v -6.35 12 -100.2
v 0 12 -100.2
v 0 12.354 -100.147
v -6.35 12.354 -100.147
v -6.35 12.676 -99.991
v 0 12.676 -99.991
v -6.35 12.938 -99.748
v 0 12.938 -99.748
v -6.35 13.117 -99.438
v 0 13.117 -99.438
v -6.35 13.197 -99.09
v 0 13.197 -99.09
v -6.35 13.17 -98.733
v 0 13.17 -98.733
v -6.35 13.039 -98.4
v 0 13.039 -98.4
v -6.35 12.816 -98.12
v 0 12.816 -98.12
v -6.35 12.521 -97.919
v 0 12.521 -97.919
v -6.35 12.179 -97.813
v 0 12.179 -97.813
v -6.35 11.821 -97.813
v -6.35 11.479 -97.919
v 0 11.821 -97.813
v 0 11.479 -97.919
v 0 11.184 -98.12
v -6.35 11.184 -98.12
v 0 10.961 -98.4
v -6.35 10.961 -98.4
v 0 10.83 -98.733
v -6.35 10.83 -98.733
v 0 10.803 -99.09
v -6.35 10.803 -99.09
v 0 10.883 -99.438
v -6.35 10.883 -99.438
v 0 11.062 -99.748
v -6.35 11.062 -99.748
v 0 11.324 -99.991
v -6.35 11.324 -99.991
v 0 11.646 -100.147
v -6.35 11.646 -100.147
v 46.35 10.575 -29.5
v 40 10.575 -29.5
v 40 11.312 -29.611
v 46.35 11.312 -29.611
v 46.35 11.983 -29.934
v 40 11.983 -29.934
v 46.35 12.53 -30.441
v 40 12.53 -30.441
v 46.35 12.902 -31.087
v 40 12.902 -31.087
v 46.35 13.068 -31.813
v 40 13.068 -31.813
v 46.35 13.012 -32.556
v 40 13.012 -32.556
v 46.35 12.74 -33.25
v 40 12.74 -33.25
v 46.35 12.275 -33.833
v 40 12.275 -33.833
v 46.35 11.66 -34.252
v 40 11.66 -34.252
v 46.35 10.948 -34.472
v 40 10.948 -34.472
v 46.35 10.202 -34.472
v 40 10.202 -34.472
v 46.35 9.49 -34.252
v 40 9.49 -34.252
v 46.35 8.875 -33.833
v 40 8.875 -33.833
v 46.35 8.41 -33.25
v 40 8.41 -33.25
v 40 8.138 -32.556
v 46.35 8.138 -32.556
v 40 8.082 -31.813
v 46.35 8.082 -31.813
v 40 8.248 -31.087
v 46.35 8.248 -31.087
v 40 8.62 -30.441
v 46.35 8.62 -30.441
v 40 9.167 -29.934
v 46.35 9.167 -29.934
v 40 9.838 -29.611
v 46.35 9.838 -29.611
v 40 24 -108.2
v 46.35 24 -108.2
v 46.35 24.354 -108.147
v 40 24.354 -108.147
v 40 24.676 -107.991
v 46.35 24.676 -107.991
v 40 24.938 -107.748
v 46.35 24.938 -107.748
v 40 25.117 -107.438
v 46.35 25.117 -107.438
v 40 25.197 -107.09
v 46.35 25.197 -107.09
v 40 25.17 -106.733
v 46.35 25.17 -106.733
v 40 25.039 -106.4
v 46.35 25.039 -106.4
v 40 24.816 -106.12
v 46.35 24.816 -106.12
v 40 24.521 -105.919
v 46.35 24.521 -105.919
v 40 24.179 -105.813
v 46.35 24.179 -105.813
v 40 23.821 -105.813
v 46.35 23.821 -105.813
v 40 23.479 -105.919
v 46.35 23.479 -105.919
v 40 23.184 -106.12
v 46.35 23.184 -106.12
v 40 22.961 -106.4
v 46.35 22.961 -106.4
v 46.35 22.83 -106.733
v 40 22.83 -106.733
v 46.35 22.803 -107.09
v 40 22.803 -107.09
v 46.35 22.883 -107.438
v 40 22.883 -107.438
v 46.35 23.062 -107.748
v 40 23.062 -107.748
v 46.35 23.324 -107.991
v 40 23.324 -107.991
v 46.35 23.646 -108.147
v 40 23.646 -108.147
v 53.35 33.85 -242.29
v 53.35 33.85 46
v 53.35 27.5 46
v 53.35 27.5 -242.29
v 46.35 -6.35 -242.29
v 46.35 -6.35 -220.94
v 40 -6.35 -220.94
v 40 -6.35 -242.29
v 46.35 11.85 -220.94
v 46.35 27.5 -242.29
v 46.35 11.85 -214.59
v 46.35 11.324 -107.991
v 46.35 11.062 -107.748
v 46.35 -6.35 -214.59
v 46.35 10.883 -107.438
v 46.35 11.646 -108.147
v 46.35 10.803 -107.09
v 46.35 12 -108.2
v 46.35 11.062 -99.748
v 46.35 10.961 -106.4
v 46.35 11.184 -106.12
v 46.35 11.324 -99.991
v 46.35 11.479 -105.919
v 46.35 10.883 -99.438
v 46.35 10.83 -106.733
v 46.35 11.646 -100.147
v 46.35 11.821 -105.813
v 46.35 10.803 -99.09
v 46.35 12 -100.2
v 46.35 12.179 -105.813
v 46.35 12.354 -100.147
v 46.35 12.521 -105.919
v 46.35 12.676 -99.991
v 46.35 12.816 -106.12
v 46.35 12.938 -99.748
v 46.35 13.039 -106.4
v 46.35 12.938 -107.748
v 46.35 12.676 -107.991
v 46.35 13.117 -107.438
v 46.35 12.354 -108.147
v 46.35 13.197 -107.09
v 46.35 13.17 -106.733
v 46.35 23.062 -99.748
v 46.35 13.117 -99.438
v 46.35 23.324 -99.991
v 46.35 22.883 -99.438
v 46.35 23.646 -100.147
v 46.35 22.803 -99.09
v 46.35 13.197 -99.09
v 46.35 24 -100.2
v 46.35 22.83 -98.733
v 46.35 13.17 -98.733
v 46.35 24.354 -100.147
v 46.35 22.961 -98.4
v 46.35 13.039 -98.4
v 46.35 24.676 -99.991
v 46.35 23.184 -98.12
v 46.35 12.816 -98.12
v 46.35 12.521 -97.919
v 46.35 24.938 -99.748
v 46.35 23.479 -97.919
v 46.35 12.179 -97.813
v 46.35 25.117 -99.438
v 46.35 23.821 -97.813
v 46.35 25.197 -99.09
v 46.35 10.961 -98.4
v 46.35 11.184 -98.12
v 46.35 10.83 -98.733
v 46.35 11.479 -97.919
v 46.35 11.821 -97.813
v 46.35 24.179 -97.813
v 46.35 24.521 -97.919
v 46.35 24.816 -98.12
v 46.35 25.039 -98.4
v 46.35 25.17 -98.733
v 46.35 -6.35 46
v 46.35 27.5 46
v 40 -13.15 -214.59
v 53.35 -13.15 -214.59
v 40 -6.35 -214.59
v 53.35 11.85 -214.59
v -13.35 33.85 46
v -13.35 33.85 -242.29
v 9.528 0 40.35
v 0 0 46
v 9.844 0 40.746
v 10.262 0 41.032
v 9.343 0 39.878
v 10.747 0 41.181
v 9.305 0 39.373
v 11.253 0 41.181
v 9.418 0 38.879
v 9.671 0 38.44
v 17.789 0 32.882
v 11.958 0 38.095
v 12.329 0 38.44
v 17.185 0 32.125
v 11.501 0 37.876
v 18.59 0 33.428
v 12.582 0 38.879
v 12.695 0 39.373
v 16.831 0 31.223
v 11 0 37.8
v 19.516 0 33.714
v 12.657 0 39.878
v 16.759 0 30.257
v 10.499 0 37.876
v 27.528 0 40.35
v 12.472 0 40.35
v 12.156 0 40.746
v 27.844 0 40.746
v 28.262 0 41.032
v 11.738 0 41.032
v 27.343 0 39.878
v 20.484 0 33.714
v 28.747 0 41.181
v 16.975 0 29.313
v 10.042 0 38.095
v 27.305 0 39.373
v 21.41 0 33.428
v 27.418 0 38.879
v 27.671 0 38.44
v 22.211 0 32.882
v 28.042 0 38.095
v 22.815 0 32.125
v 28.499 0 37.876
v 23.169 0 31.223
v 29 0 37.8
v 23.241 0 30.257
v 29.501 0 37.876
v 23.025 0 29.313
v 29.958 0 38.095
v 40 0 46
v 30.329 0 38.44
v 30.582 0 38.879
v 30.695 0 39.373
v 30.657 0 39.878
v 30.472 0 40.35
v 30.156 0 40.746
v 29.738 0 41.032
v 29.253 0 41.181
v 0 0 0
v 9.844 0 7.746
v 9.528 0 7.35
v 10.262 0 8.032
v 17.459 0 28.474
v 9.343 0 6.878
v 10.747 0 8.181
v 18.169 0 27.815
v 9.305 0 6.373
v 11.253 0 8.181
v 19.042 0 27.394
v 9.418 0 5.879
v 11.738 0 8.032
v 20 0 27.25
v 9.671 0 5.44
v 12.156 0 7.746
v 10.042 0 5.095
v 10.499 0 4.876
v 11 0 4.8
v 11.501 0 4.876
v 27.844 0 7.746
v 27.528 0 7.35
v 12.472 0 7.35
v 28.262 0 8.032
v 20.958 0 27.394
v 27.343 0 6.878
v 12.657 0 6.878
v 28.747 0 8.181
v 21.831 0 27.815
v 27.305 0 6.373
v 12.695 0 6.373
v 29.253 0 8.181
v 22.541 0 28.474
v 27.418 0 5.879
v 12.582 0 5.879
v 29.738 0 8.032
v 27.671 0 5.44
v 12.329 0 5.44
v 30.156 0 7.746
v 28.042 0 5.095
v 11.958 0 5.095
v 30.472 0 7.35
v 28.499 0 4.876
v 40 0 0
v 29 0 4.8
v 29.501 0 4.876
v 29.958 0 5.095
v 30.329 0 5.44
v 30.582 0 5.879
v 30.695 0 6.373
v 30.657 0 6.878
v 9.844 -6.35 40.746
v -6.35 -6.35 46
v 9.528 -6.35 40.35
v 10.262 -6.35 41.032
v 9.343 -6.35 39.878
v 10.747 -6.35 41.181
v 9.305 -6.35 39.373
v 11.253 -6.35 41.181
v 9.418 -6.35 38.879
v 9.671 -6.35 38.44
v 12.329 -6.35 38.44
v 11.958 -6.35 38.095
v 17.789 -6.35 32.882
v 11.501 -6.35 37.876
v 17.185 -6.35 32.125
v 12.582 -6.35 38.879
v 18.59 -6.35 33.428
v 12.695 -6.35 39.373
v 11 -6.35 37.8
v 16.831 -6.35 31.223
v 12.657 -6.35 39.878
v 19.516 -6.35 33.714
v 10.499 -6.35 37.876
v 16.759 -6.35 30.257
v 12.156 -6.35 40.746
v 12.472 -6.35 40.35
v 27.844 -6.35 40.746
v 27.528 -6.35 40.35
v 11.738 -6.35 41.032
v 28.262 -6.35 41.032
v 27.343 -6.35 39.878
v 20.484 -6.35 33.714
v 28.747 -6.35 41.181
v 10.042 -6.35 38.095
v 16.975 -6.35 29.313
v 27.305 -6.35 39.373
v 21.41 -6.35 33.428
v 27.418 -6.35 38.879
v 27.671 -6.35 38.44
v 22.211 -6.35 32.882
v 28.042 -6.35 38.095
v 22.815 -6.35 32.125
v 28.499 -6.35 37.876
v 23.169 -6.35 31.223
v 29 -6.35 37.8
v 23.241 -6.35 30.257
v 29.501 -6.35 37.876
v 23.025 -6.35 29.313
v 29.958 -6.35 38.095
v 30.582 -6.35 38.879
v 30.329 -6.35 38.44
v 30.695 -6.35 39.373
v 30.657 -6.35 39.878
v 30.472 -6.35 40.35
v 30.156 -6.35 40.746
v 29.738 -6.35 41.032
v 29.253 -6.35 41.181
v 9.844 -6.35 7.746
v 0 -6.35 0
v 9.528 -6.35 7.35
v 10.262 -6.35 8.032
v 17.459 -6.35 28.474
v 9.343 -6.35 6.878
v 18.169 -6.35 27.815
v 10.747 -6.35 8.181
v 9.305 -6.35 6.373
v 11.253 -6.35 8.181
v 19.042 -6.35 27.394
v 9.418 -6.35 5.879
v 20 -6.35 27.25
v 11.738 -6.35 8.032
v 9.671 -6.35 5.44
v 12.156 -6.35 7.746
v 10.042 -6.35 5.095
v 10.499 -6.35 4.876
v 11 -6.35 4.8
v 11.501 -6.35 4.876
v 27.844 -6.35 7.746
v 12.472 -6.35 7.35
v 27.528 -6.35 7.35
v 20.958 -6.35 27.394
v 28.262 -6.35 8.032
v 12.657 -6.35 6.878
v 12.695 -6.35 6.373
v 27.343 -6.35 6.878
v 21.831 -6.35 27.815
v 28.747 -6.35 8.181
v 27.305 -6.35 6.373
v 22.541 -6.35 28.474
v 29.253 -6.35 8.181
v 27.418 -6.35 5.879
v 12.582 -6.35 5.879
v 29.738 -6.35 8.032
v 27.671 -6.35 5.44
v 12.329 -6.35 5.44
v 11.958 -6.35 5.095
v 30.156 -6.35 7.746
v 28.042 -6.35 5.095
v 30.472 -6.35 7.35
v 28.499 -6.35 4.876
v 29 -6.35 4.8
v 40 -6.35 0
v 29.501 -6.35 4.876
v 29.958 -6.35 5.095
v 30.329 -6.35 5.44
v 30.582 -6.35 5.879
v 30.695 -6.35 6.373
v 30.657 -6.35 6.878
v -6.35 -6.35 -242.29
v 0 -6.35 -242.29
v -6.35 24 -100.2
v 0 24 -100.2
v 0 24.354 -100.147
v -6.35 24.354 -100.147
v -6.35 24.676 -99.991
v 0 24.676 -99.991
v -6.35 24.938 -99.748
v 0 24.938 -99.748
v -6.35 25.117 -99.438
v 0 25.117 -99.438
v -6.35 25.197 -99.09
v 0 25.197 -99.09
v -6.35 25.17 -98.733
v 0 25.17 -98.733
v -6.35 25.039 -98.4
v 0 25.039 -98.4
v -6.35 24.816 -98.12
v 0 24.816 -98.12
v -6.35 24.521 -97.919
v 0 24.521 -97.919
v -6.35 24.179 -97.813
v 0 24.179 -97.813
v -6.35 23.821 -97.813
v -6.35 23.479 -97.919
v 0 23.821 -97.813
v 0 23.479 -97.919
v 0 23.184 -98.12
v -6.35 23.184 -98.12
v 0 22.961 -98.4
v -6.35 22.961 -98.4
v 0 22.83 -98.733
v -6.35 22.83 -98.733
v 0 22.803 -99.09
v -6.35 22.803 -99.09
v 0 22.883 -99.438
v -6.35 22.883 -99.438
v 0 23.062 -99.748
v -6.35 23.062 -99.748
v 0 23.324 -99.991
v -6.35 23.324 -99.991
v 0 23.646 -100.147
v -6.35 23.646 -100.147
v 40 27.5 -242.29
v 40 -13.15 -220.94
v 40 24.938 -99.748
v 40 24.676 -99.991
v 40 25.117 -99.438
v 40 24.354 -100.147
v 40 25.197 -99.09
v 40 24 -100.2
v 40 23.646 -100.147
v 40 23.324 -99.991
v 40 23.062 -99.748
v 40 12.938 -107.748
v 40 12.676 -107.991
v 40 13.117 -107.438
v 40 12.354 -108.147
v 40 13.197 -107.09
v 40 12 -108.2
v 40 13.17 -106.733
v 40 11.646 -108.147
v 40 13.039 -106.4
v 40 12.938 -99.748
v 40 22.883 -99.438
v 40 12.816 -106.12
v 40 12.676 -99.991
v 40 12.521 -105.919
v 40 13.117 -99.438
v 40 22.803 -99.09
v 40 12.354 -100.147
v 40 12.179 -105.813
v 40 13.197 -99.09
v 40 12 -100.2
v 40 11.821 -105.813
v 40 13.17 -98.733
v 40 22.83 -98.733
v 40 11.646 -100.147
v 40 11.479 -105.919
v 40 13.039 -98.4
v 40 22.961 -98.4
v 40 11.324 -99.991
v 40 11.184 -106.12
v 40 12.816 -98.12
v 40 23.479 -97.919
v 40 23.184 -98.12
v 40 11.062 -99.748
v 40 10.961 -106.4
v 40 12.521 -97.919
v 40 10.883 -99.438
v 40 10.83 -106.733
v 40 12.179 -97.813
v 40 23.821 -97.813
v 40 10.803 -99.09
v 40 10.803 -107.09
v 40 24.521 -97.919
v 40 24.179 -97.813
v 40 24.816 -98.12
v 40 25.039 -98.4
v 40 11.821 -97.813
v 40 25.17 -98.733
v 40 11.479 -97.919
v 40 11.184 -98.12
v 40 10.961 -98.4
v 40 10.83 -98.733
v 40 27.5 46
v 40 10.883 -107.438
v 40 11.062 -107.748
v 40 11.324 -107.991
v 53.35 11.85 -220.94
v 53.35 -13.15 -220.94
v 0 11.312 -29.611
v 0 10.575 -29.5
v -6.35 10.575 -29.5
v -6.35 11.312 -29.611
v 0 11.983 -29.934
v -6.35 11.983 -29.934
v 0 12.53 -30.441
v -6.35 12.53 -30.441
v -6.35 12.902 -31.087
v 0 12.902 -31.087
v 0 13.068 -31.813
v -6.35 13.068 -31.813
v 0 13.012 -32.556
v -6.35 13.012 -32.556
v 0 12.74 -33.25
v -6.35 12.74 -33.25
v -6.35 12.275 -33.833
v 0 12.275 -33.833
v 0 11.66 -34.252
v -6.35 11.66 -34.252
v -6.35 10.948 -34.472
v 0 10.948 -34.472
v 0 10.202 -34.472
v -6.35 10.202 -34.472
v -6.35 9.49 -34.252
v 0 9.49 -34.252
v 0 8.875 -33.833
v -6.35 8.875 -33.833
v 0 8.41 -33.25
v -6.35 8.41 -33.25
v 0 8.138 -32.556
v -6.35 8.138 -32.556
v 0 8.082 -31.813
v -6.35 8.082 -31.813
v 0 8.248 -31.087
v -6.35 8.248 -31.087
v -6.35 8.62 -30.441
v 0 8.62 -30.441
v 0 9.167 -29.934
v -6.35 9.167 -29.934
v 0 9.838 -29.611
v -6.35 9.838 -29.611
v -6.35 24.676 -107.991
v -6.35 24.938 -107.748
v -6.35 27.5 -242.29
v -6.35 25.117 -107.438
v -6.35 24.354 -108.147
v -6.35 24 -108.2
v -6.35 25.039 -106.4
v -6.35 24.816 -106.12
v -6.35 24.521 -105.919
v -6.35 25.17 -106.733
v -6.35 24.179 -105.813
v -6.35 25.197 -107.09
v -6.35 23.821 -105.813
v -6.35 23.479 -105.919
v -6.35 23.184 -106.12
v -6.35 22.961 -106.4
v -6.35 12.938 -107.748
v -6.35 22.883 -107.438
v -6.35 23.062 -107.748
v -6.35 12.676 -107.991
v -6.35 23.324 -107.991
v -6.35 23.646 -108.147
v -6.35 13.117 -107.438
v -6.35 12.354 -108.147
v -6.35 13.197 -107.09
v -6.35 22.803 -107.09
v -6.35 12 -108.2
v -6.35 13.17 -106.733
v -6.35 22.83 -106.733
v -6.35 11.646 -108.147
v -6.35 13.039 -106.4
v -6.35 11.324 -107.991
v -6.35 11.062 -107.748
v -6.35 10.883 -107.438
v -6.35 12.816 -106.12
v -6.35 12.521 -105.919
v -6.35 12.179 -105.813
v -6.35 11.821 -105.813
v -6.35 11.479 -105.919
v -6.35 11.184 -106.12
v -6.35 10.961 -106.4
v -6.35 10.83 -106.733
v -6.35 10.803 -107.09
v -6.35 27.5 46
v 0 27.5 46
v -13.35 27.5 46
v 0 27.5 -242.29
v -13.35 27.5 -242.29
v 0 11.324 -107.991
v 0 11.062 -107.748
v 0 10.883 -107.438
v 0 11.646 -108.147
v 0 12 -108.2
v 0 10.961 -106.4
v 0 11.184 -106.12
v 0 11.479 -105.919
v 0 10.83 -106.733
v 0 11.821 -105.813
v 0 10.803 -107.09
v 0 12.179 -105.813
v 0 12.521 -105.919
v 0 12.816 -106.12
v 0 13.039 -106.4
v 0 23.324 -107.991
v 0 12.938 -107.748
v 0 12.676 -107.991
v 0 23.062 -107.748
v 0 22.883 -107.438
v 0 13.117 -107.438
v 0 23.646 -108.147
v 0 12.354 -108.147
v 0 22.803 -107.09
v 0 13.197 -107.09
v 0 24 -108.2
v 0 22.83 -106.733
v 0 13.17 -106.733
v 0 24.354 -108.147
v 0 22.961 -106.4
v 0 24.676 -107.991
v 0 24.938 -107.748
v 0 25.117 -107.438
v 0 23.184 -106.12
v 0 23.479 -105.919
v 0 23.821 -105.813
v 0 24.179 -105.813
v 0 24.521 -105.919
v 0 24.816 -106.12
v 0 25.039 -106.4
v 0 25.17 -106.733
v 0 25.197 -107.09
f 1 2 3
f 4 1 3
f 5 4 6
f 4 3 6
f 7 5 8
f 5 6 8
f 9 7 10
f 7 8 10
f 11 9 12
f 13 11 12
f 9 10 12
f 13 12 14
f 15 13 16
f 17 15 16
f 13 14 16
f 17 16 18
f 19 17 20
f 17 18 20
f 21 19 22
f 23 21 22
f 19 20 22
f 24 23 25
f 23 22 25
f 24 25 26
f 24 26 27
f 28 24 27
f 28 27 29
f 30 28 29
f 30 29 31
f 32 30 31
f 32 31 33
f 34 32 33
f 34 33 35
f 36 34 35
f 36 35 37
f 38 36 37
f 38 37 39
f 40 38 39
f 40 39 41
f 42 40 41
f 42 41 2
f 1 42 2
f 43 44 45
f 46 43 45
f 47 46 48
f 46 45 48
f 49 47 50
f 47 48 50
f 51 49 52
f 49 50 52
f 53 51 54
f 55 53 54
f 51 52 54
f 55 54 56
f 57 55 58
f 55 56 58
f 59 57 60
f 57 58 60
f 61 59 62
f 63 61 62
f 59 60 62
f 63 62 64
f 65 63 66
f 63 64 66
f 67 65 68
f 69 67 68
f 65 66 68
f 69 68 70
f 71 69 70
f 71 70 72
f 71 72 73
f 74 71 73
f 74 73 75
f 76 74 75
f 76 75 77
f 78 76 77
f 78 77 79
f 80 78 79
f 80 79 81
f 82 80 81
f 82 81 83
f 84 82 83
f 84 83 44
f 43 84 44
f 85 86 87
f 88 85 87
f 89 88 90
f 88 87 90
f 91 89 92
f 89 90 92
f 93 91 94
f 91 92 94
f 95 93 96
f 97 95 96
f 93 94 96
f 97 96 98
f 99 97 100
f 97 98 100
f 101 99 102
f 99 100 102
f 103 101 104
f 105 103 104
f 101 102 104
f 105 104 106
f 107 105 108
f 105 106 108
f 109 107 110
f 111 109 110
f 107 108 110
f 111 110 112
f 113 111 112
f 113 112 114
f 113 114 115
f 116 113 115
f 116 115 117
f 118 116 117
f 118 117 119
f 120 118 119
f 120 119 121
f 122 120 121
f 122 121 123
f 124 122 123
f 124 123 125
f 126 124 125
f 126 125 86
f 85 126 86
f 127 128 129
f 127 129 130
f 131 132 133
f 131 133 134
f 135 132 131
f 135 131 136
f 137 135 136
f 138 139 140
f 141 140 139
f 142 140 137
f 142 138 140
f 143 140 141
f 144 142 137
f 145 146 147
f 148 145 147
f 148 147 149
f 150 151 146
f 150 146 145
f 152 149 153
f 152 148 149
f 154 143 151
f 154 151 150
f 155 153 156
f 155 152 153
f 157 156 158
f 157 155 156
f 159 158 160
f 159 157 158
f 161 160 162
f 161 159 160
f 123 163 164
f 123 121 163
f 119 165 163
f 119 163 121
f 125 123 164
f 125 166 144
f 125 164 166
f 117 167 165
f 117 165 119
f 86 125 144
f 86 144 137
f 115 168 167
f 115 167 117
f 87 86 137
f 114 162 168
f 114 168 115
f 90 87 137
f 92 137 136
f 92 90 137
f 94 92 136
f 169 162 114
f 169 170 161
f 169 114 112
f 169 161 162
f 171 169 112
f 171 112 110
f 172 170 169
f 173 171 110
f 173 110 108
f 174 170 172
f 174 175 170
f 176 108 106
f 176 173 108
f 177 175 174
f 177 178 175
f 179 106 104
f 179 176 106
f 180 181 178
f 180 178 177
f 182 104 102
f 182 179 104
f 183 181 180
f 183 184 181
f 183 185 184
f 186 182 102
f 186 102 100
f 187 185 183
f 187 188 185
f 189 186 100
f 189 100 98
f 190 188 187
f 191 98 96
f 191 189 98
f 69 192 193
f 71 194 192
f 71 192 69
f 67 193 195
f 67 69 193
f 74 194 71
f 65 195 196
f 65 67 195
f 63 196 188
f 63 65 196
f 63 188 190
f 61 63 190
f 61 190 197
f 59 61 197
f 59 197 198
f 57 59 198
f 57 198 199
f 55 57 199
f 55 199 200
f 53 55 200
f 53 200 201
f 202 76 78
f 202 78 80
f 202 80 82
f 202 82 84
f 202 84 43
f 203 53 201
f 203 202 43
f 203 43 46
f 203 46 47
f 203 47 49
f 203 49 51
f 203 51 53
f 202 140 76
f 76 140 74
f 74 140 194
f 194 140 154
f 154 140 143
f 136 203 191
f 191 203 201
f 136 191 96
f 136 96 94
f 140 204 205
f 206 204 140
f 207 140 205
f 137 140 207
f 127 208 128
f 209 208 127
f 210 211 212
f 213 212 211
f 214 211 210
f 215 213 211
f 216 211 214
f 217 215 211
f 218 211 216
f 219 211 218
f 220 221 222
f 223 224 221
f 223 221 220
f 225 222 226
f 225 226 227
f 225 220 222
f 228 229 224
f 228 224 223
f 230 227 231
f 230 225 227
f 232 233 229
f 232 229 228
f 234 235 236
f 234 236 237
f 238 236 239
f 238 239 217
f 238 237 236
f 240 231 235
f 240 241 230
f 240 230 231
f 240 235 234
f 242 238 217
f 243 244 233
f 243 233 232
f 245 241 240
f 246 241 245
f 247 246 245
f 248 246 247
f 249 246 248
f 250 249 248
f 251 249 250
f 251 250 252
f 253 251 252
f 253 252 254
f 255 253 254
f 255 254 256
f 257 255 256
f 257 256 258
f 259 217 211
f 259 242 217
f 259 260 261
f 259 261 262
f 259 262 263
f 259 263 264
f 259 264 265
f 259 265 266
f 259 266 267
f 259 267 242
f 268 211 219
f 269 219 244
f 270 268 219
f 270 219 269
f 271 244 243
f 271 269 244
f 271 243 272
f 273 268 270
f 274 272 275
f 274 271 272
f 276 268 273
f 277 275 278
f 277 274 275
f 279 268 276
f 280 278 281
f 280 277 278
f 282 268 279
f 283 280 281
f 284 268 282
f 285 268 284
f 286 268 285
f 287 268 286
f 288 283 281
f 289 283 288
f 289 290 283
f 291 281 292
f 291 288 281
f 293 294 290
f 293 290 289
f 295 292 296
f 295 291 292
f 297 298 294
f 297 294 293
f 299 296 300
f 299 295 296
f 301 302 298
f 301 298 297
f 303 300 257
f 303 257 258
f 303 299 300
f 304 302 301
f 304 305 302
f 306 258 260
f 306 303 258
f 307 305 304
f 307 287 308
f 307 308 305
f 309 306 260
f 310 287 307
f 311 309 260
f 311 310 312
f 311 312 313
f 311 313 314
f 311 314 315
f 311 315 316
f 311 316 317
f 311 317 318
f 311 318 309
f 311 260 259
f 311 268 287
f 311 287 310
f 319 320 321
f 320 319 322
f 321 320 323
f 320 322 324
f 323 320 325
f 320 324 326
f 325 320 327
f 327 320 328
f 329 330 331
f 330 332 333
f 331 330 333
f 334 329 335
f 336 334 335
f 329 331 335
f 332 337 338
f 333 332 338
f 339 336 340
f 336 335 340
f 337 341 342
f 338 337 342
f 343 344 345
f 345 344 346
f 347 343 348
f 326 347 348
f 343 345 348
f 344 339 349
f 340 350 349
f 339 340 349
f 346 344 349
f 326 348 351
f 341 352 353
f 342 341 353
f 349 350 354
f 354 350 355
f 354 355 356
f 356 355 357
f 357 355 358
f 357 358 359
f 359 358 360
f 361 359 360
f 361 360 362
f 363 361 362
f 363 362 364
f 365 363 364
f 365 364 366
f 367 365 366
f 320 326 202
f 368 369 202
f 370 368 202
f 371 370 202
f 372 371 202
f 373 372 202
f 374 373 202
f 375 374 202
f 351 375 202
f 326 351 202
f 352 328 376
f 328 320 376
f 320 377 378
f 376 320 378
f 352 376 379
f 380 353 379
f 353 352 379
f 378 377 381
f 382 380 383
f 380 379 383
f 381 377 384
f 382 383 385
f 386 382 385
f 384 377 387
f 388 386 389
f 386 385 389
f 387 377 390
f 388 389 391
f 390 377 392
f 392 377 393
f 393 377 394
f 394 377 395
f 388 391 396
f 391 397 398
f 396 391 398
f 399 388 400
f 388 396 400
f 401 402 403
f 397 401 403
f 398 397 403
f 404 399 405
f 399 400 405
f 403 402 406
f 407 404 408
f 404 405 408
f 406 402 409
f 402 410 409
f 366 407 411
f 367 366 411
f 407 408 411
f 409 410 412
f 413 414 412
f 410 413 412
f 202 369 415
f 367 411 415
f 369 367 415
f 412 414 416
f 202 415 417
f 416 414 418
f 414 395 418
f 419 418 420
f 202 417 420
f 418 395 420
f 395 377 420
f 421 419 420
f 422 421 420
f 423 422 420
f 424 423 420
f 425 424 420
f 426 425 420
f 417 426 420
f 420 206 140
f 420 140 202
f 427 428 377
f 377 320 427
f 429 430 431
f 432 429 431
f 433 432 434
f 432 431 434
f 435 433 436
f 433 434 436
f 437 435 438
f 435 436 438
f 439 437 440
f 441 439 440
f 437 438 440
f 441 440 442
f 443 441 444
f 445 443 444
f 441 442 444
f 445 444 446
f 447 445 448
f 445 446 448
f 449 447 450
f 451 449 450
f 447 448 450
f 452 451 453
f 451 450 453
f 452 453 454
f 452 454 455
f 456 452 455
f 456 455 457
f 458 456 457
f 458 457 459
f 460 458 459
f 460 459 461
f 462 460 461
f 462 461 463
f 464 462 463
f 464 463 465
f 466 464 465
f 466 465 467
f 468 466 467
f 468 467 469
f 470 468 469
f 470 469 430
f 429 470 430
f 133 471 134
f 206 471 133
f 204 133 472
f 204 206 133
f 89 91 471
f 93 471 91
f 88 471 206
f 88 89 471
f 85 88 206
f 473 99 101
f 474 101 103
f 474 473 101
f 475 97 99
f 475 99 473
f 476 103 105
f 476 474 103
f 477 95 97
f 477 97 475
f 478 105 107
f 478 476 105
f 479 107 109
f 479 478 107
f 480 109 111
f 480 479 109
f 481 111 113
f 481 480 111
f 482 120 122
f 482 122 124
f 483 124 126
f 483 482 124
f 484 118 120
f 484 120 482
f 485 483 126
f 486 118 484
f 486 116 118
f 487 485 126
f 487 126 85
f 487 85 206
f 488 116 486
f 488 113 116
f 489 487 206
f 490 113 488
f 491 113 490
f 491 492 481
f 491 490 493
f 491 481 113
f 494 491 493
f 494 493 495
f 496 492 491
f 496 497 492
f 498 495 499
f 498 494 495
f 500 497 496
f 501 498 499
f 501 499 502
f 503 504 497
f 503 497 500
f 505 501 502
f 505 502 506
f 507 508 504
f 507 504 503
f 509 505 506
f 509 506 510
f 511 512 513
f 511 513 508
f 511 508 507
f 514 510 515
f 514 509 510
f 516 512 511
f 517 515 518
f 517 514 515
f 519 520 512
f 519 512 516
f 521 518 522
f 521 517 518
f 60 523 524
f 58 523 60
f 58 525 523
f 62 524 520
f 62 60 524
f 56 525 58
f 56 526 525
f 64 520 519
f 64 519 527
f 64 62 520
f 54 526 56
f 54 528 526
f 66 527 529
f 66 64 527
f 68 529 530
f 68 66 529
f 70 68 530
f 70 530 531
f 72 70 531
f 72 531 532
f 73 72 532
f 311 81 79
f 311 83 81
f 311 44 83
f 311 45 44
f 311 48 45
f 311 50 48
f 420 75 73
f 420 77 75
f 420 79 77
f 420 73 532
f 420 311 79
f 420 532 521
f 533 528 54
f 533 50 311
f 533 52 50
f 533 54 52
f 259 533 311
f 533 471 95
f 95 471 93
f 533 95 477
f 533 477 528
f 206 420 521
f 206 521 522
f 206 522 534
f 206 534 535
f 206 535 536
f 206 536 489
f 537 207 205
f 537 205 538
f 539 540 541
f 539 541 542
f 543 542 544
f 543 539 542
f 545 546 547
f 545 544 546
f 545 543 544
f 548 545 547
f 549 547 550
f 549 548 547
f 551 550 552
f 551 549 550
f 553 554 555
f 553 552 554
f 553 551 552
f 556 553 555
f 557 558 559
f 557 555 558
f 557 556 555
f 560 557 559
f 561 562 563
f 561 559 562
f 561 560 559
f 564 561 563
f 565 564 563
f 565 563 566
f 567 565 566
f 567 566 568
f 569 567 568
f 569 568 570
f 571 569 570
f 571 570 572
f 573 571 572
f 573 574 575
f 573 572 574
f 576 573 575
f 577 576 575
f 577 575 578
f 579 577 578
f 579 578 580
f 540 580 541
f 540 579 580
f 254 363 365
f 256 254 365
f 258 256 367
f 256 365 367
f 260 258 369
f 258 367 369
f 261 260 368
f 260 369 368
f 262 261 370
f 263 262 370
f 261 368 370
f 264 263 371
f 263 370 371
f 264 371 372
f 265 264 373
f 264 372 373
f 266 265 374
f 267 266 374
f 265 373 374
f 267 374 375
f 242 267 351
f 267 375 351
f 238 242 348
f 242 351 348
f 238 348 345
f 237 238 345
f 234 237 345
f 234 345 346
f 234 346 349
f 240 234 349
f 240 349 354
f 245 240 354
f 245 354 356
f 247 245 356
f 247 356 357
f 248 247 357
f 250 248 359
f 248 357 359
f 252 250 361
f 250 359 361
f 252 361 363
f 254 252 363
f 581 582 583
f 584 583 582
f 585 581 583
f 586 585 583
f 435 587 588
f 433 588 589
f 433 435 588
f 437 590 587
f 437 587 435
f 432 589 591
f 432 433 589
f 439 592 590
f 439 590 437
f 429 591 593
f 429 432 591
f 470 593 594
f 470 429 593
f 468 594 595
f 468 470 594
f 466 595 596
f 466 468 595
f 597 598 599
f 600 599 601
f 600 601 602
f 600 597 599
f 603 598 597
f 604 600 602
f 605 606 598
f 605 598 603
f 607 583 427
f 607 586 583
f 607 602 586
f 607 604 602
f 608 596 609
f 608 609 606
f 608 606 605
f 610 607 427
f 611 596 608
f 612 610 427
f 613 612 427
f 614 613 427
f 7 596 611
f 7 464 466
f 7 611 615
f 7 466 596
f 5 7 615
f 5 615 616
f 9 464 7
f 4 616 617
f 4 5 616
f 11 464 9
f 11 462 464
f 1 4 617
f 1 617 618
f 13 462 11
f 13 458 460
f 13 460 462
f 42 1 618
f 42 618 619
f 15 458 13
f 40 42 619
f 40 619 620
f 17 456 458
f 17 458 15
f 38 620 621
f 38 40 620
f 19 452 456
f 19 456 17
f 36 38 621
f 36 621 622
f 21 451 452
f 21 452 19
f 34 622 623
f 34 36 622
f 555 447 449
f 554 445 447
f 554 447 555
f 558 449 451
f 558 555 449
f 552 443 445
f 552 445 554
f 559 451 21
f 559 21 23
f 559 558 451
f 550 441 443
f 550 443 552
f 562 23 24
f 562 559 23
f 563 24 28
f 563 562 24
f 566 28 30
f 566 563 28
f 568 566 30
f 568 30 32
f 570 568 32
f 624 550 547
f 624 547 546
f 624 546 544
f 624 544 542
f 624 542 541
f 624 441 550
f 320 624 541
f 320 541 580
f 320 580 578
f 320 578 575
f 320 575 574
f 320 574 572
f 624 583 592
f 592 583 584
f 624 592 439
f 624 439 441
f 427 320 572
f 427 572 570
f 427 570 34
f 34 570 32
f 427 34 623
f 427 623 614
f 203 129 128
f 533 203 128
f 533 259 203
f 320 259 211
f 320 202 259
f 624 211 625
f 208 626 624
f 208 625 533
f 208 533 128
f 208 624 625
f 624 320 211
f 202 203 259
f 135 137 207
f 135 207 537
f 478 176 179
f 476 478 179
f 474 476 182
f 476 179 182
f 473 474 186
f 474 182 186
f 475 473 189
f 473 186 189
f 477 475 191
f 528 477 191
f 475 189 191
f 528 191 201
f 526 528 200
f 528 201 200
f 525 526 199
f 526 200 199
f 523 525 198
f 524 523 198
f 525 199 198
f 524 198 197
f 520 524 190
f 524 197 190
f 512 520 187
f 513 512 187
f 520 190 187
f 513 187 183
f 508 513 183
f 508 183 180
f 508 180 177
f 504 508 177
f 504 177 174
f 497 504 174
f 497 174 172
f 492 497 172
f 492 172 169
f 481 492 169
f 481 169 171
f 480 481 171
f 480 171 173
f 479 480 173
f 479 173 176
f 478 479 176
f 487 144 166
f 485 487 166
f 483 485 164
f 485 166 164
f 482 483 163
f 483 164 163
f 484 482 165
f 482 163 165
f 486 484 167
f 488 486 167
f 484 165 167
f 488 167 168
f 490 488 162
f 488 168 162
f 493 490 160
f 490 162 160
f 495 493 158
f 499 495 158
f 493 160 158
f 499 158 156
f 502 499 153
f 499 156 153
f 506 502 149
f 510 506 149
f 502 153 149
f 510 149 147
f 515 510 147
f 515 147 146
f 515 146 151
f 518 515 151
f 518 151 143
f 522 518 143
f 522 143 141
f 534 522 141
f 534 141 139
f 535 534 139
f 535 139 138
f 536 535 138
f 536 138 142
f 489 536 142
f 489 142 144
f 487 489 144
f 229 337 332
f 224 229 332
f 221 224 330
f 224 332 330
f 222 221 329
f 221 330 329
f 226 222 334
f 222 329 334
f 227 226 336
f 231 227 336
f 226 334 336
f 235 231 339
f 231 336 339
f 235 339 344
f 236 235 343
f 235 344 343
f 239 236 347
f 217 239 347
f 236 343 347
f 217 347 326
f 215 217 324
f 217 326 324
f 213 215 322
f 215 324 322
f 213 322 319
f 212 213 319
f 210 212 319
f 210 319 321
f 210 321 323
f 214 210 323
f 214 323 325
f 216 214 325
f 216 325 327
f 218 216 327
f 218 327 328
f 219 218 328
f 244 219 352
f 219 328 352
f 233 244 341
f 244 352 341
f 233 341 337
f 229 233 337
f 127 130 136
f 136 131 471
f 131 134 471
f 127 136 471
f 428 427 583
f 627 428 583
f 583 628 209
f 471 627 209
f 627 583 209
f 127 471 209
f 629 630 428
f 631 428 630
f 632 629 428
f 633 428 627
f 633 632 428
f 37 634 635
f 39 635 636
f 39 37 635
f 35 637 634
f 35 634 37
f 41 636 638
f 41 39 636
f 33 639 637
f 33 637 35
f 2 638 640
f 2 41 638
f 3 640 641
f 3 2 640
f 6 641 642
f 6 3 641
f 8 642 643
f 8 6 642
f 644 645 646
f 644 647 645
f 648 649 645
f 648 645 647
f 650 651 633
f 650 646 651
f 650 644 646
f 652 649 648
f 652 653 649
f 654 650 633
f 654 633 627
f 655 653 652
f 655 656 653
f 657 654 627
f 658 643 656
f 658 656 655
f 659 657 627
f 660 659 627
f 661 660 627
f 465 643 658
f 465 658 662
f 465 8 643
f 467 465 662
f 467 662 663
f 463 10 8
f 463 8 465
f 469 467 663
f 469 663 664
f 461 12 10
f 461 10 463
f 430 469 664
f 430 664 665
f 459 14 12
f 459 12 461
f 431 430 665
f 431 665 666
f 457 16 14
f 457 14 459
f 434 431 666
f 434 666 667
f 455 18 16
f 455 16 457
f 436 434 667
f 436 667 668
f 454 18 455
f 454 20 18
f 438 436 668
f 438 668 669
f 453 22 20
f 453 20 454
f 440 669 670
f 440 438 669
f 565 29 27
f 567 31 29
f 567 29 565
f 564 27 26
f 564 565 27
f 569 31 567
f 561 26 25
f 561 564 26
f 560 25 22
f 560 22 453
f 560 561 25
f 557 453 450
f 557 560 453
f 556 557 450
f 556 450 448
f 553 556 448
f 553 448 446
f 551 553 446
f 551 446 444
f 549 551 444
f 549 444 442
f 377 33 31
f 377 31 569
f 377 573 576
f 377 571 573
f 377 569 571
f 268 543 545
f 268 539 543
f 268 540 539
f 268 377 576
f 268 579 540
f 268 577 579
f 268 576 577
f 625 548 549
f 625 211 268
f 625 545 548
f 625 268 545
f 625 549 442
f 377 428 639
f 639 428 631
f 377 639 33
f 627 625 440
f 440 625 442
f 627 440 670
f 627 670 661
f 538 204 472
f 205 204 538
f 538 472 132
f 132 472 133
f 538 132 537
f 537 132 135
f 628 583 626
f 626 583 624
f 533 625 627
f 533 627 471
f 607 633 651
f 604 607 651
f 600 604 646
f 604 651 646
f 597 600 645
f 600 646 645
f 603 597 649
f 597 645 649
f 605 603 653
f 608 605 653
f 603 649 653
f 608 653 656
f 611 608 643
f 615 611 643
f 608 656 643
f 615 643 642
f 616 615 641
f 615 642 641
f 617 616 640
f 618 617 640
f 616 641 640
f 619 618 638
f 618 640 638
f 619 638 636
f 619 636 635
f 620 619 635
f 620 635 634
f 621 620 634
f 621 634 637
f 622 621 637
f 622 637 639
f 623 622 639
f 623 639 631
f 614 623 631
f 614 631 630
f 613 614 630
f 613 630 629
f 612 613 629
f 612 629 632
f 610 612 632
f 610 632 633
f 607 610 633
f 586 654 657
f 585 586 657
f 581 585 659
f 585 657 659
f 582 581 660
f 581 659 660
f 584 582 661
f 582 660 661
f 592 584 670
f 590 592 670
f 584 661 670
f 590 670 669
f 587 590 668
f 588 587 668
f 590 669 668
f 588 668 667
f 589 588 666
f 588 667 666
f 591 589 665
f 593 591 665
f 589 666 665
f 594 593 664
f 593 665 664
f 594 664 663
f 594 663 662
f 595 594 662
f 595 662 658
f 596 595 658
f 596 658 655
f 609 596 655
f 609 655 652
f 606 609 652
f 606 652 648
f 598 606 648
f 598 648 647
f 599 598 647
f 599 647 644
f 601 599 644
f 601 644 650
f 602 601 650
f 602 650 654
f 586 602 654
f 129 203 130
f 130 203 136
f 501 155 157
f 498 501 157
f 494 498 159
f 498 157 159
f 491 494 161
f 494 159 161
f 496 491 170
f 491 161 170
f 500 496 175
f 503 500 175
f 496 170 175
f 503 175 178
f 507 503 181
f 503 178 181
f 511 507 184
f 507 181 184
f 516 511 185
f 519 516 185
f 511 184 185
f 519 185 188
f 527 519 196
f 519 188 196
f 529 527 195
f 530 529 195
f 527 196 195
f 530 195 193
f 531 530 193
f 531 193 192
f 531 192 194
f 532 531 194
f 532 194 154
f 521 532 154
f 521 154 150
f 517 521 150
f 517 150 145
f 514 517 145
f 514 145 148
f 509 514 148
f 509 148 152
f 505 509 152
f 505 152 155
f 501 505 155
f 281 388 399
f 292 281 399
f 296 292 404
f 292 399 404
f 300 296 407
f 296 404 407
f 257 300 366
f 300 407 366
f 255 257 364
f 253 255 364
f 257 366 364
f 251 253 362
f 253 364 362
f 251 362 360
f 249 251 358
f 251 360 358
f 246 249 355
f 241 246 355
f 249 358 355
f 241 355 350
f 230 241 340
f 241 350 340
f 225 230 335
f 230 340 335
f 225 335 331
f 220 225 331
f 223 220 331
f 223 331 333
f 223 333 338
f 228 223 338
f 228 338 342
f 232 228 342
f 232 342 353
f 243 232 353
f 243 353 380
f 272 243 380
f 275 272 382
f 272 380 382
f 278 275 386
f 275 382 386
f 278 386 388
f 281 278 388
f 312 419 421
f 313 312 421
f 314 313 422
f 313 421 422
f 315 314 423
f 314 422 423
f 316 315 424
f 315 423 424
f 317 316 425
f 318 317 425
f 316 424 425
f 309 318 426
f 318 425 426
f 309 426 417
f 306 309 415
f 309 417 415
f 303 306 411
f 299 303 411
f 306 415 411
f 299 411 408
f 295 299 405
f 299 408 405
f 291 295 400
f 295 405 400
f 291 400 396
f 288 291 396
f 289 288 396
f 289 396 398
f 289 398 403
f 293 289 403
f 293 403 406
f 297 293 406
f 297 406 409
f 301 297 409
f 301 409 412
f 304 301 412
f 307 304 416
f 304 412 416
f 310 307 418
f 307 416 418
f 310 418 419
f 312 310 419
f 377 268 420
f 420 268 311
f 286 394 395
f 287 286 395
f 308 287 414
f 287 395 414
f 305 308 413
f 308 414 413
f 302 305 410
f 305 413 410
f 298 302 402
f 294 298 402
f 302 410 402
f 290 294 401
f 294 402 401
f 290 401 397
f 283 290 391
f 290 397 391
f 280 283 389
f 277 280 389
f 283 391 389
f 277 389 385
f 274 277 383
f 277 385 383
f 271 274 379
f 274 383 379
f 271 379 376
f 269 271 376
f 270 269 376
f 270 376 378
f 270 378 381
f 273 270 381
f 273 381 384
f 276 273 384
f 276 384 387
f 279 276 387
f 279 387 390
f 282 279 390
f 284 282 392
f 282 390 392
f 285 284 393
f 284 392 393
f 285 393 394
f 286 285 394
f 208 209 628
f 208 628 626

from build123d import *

# Parameters (mm, degrees)
SKETCH1_W                      = 52.7
SKETCH1_H                      = 40.2
SKETCH1_W_2                    = 40
SKETCH1_H_2                    = 27.5
BOSS_EXTRUDE1_DEPTH            = 46
SKETCH2_R                      = 1.7
SKETCH2_R_2                    = 3.25
CUT_EXTRUDE1_DEPTH             = 6.35
BOSS_EXTRUDE2_DEPTH            = 242.29
SKETCH4_W                      = 288.29
SKETCH4_H                      = 6.35
BOSS_EXTRUDE3_DEPTH            = 7
SKETCH6_W                      = 288.29
SKETCH6_H                      = 6.35
BOSS_EXTRUDE4_DEPTH            = 7
SKETCH7_W                      = 6.35
SKETCH7_H                      = 25
BOSS_EXTRUDE5_DEPTH            = 7
CUT_EXTRUDE2_REACH             = 297.989
SKETCH9_R                      = 2.5
CUT_EXTRUDE2_DIRECTION_2_REACH = 297.989
CUT_EXTRUDE3_REACH             = 253.822
SKETCH10_R                     = 1.2
SKETCH11_W                     = 21.35
SKETCH11_H                     = 6.8
SKETCH11_W_2                   = 214.59
CUT_EXTRUDE4_DEPTH             = 52.7
SKETCH12_W                     = 6.35
SKETCH12_H                     = 6.35
CUT_EXTRUDE5_DEPTH             = 6.8


with BuildPart() as part:
    # Sketch1 → Boss-Extrude1 (new body)
    with BuildSketch(Plane.XY):
        with Locations((20, 13.75)):
            Rectangle(SKETCH1_W, SKETCH1_H)
        with Locations((20, 13.75)):
            Rectangle(SKETCH1_W_2, SKETCH1_H_2, mode=Mode.SUBTRACT)
    extrude(amount=BOSS_EXTRUDE1_DEPTH)

    # Sketch2 → Cut-Extrude1 (cut)
    with BuildSketch(Plane.XZ.offset(6.35)):
        with Locations(Location((29, 39.5, 0), (0, 0, 270))):
            Circle(SKETCH2_R)
        with Locations(Location((11, 39.5, 0), (0, 0, 270))):
            Circle(SKETCH2_R)
        with Locations(Location((11, 6.5, 0), (0, 0, 270))):
            Circle(SKETCH2_R)
        with Locations(Location((29, 6.5, 0), (0, 0, 270))):
            Circle(SKETCH2_R)
        with Locations(Location((20, 30.5, 0), (0, 0, 270))):
            Circle(SKETCH2_R_2)
    extrude(amount=-CUT_EXTRUDE1_DEPTH, mode=Mode.SUBTRACT)

    # Sketch3 → Boss-Extrude2 (add)
    with BuildSketch(Plane(origin=(0, 0, 0), x_dir=(-1, 0, 0), z_dir=(0, 0, -1))):
        Polygon((6.35, 33.85), (6.35, -13.15), (0, -13.15), (0, 27.5), (-40, 27.5), (-40, -13.15), (-46.35, -13.15), (-46.35, 33.85), align=None)
    extrude(amount=BOSS_EXTRUDE2_DEPTH)

    # Sketch4 → Boss-Extrude3 (add)
    with BuildSketch(Plane.ZY.offset(6.35)):
        with Locations((-98.145, 30.675)):
            Rectangle(SKETCH4_W, SKETCH4_H)
    extrude(amount=BOSS_EXTRUDE3_DEPTH)

    # Sketch6 → Boss-Extrude4 (add)
    with BuildSketch(Plane(origin=(46.35, 0, 0), x_dir=(0, 0, -1), z_dir=(1, 0, 0))):
        with Locations((98.145, 30.675)):
            Rectangle(SKETCH6_W, SKETCH6_H)
    extrude(amount=BOSS_EXTRUDE4_DEPTH)

    # Sketch7 → Boss-Extrude5 (add)
    with BuildSketch(Plane(origin=(46.35, 0, 0), x_dir=(0, 0, -1), z_dir=(1, 0, 0))):
        with Locations((217.765, -0.65)):
            Rectangle(SKETCH7_W, SKETCH7_H)
    extrude(amount=BOSS_EXTRUDE5_DEPTH)

    # Cut-Extrude2: up to this face of the body (flat: up to its plane)
    cut_extrude2_end = Plane(part.part.faces().sort_by_distance((46.35, 7.756141986, -99.825781006))[0])
    # Sketch9 → Cut-Extrude2 (cut, up to the picked face)
    with BuildSketch(Plane(origin=(40, 27.5, -242.29), x_dir=(0, 0, 1), z_dir=(-1, 0, 0)), mode=Mode.PRIVATE) as cut_extrude2_sk1:
        with Locations((210.29, -16.925)):
            Circle(SKETCH9_R)
    cut_extrude2_tool1 = split(extrude(cut_extrude2_sk1.sketch, amount=-CUT_EXTRUDE2_REACH, mode=Mode.PRIVATE), bisect_by=cut_extrude2_end, keep=Keep.BOTH, mode=Mode.PRIVATE)
    add(cut_extrude2_tool1.solids().sort_by(Axis((40, 10.575, -32), (1, 0, 0)))[0], mode=Mode.SUBTRACT)

    # Cut-Extrude2 direction 2: up to this face of the body (flat: up to its plane)
    cut_extrude2_direction_2_end = Plane(part.part.faces().sort_by_distance((-6.35, 7.639146283, -101.467245288))[0])
    # Sketch9 → Cut-Extrude2 direction 2 (cut, up to the picked face)
    with BuildSketch(Plane(origin=(40, 27.5, -242.29), x_dir=(0, 0, 1), z_dir=(-1, 0, 0)), mode=Mode.PRIVATE) as cut_extrude2_direction_2_sk1:
        with Locations((210.29, -16.925)):
            Circle(SKETCH9_R)
    cut_extrude2_direction_2_tool1 = split(extrude(cut_extrude2_direction_2_sk1.sketch, amount=CUT_EXTRUDE2_DIRECTION_2_REACH, mode=Mode.PRIVATE), bisect_by=cut_extrude2_direction_2_end, keep=Keep.BOTH, mode=Mode.PRIVATE)
    add(cut_extrude2_direction_2_tool1.solids().sort_by(Axis((40, 10.575, -32), (-1, 0, 0)))[0], mode=Mode.SUBTRACT)

    # Cut-Extrude3: up to this face of the body (flat: up to its plane)
    cut_extrude3_end = Plane(part.part.faces().sort_by_distance((-6.35, 7.634083702, -101.587034491))[0])
    # Sketch10 → Cut-Extrude3 (cut, up to the picked face)
    with BuildSketch(Plane(origin=(46.35, 0, 0), x_dir=(0, 0, -1), z_dir=(1, 0, 0)), mode=Mode.PRIVATE) as cut_extrude3_sk1:
        with Locations((99, 24)):
            Circle(SKETCH10_R)
    cut_extrude3_tool1 = split(extrude(cut_extrude3_sk1.sketch, amount=-CUT_EXTRUDE3_REACH, mode=Mode.PRIVATE), bisect_by=cut_extrude3_end, keep=Keep.BOTH, mode=Mode.PRIVATE)
    # Sketch10 → Cut-Extrude3 (cut, up to the picked face)
    with BuildSketch(Plane(origin=(46.35, 0, 0), x_dir=(0, 0, -1), z_dir=(1, 0, 0)), mode=Mode.PRIVATE) as cut_extrude3_sk2:
        with Locations((99, 12)):
            Circle(SKETCH10_R)
    cut_extrude3_tool2 = split(extrude(cut_extrude3_sk2.sketch, amount=-CUT_EXTRUDE3_REACH, mode=Mode.PRIVATE), bisect_by=cut_extrude3_end, keep=Keep.BOTH, mode=Mode.PRIVATE)
    # Sketch10 → Cut-Extrude3 (cut, up to the picked face)
    with BuildSketch(Plane(origin=(46.35, 0, 0), x_dir=(0, 0, -1), z_dir=(1, 0, 0)), mode=Mode.PRIVATE) as cut_extrude3_sk3:
        with Locations((107, 12)):
            Circle(SKETCH10_R)
    cut_extrude3_tool3 = split(extrude(cut_extrude3_sk3.sketch, amount=-CUT_EXTRUDE3_REACH, mode=Mode.PRIVATE), bisect_by=cut_extrude3_end, keep=Keep.BOTH, mode=Mode.PRIVATE)
    # Sketch10 → Cut-Extrude3 (cut, up to the picked face)
    with BuildSketch(Plane(origin=(46.35, 0, 0), x_dir=(0, 0, -1), z_dir=(1, 0, 0)), mode=Mode.PRIVATE) as cut_extrude3_sk4:
        with Locations((107, 24)):
            Circle(SKETCH10_R)
    cut_extrude3_tool4 = split(extrude(cut_extrude3_sk4.sketch, amount=-CUT_EXTRUDE3_REACH, mode=Mode.PRIVATE), bisect_by=cut_extrude3_end, keep=Keep.BOTH, mode=Mode.PRIVATE)
    add(cut_extrude3_tool1.solids().sort_by(Axis((46.35, 24, -99), (-1, 0, 0)))[0], mode=Mode.SUBTRACT)
    add(cut_extrude3_tool2.solids().sort_by(Axis((46.35, 12, -99), (-1, 0, 0)))[0], mode=Mode.SUBTRACT)
    add(cut_extrude3_tool3.solids().sort_by(Axis((46.35, 12, -107), (-1, 0, 0)))[0], mode=Mode.SUBTRACT)
    add(cut_extrude3_tool4.solids().sort_by(Axis((46.35, 24, -107), (-1, 0, 0)))[0], mode=Mode.SUBTRACT)

    # Sketch11 → Cut-Extrude4 (cut)
    with BuildSketch(Plane(origin=(46.35, 0, 0), x_dir=(0, 0, -1), z_dir=(1, 0, 0))):
        with Locations((231.615, -9.75)):
            Rectangle(SKETCH11_W, SKETCH11_H)
        with Locations((107.295, -9.75)):
            Rectangle(SKETCH11_W_2, SKETCH11_H)
    extrude(amount=-CUT_EXTRUDE4_DEPTH, mode=Mode.SUBTRACT)

    # Sketch12 → Cut-Extrude5 (cut)
    with BuildSketch(Plane.XZ.offset(13.15)):
        with Locations((-3.175, -217.765)):
            Rectangle(SKETCH12_W, SKETCH12_H)
    extrude(amount=-CUT_EXTRUDE5_DEPTH, mode=Mode.SUBTRACT)


solid = part.part
